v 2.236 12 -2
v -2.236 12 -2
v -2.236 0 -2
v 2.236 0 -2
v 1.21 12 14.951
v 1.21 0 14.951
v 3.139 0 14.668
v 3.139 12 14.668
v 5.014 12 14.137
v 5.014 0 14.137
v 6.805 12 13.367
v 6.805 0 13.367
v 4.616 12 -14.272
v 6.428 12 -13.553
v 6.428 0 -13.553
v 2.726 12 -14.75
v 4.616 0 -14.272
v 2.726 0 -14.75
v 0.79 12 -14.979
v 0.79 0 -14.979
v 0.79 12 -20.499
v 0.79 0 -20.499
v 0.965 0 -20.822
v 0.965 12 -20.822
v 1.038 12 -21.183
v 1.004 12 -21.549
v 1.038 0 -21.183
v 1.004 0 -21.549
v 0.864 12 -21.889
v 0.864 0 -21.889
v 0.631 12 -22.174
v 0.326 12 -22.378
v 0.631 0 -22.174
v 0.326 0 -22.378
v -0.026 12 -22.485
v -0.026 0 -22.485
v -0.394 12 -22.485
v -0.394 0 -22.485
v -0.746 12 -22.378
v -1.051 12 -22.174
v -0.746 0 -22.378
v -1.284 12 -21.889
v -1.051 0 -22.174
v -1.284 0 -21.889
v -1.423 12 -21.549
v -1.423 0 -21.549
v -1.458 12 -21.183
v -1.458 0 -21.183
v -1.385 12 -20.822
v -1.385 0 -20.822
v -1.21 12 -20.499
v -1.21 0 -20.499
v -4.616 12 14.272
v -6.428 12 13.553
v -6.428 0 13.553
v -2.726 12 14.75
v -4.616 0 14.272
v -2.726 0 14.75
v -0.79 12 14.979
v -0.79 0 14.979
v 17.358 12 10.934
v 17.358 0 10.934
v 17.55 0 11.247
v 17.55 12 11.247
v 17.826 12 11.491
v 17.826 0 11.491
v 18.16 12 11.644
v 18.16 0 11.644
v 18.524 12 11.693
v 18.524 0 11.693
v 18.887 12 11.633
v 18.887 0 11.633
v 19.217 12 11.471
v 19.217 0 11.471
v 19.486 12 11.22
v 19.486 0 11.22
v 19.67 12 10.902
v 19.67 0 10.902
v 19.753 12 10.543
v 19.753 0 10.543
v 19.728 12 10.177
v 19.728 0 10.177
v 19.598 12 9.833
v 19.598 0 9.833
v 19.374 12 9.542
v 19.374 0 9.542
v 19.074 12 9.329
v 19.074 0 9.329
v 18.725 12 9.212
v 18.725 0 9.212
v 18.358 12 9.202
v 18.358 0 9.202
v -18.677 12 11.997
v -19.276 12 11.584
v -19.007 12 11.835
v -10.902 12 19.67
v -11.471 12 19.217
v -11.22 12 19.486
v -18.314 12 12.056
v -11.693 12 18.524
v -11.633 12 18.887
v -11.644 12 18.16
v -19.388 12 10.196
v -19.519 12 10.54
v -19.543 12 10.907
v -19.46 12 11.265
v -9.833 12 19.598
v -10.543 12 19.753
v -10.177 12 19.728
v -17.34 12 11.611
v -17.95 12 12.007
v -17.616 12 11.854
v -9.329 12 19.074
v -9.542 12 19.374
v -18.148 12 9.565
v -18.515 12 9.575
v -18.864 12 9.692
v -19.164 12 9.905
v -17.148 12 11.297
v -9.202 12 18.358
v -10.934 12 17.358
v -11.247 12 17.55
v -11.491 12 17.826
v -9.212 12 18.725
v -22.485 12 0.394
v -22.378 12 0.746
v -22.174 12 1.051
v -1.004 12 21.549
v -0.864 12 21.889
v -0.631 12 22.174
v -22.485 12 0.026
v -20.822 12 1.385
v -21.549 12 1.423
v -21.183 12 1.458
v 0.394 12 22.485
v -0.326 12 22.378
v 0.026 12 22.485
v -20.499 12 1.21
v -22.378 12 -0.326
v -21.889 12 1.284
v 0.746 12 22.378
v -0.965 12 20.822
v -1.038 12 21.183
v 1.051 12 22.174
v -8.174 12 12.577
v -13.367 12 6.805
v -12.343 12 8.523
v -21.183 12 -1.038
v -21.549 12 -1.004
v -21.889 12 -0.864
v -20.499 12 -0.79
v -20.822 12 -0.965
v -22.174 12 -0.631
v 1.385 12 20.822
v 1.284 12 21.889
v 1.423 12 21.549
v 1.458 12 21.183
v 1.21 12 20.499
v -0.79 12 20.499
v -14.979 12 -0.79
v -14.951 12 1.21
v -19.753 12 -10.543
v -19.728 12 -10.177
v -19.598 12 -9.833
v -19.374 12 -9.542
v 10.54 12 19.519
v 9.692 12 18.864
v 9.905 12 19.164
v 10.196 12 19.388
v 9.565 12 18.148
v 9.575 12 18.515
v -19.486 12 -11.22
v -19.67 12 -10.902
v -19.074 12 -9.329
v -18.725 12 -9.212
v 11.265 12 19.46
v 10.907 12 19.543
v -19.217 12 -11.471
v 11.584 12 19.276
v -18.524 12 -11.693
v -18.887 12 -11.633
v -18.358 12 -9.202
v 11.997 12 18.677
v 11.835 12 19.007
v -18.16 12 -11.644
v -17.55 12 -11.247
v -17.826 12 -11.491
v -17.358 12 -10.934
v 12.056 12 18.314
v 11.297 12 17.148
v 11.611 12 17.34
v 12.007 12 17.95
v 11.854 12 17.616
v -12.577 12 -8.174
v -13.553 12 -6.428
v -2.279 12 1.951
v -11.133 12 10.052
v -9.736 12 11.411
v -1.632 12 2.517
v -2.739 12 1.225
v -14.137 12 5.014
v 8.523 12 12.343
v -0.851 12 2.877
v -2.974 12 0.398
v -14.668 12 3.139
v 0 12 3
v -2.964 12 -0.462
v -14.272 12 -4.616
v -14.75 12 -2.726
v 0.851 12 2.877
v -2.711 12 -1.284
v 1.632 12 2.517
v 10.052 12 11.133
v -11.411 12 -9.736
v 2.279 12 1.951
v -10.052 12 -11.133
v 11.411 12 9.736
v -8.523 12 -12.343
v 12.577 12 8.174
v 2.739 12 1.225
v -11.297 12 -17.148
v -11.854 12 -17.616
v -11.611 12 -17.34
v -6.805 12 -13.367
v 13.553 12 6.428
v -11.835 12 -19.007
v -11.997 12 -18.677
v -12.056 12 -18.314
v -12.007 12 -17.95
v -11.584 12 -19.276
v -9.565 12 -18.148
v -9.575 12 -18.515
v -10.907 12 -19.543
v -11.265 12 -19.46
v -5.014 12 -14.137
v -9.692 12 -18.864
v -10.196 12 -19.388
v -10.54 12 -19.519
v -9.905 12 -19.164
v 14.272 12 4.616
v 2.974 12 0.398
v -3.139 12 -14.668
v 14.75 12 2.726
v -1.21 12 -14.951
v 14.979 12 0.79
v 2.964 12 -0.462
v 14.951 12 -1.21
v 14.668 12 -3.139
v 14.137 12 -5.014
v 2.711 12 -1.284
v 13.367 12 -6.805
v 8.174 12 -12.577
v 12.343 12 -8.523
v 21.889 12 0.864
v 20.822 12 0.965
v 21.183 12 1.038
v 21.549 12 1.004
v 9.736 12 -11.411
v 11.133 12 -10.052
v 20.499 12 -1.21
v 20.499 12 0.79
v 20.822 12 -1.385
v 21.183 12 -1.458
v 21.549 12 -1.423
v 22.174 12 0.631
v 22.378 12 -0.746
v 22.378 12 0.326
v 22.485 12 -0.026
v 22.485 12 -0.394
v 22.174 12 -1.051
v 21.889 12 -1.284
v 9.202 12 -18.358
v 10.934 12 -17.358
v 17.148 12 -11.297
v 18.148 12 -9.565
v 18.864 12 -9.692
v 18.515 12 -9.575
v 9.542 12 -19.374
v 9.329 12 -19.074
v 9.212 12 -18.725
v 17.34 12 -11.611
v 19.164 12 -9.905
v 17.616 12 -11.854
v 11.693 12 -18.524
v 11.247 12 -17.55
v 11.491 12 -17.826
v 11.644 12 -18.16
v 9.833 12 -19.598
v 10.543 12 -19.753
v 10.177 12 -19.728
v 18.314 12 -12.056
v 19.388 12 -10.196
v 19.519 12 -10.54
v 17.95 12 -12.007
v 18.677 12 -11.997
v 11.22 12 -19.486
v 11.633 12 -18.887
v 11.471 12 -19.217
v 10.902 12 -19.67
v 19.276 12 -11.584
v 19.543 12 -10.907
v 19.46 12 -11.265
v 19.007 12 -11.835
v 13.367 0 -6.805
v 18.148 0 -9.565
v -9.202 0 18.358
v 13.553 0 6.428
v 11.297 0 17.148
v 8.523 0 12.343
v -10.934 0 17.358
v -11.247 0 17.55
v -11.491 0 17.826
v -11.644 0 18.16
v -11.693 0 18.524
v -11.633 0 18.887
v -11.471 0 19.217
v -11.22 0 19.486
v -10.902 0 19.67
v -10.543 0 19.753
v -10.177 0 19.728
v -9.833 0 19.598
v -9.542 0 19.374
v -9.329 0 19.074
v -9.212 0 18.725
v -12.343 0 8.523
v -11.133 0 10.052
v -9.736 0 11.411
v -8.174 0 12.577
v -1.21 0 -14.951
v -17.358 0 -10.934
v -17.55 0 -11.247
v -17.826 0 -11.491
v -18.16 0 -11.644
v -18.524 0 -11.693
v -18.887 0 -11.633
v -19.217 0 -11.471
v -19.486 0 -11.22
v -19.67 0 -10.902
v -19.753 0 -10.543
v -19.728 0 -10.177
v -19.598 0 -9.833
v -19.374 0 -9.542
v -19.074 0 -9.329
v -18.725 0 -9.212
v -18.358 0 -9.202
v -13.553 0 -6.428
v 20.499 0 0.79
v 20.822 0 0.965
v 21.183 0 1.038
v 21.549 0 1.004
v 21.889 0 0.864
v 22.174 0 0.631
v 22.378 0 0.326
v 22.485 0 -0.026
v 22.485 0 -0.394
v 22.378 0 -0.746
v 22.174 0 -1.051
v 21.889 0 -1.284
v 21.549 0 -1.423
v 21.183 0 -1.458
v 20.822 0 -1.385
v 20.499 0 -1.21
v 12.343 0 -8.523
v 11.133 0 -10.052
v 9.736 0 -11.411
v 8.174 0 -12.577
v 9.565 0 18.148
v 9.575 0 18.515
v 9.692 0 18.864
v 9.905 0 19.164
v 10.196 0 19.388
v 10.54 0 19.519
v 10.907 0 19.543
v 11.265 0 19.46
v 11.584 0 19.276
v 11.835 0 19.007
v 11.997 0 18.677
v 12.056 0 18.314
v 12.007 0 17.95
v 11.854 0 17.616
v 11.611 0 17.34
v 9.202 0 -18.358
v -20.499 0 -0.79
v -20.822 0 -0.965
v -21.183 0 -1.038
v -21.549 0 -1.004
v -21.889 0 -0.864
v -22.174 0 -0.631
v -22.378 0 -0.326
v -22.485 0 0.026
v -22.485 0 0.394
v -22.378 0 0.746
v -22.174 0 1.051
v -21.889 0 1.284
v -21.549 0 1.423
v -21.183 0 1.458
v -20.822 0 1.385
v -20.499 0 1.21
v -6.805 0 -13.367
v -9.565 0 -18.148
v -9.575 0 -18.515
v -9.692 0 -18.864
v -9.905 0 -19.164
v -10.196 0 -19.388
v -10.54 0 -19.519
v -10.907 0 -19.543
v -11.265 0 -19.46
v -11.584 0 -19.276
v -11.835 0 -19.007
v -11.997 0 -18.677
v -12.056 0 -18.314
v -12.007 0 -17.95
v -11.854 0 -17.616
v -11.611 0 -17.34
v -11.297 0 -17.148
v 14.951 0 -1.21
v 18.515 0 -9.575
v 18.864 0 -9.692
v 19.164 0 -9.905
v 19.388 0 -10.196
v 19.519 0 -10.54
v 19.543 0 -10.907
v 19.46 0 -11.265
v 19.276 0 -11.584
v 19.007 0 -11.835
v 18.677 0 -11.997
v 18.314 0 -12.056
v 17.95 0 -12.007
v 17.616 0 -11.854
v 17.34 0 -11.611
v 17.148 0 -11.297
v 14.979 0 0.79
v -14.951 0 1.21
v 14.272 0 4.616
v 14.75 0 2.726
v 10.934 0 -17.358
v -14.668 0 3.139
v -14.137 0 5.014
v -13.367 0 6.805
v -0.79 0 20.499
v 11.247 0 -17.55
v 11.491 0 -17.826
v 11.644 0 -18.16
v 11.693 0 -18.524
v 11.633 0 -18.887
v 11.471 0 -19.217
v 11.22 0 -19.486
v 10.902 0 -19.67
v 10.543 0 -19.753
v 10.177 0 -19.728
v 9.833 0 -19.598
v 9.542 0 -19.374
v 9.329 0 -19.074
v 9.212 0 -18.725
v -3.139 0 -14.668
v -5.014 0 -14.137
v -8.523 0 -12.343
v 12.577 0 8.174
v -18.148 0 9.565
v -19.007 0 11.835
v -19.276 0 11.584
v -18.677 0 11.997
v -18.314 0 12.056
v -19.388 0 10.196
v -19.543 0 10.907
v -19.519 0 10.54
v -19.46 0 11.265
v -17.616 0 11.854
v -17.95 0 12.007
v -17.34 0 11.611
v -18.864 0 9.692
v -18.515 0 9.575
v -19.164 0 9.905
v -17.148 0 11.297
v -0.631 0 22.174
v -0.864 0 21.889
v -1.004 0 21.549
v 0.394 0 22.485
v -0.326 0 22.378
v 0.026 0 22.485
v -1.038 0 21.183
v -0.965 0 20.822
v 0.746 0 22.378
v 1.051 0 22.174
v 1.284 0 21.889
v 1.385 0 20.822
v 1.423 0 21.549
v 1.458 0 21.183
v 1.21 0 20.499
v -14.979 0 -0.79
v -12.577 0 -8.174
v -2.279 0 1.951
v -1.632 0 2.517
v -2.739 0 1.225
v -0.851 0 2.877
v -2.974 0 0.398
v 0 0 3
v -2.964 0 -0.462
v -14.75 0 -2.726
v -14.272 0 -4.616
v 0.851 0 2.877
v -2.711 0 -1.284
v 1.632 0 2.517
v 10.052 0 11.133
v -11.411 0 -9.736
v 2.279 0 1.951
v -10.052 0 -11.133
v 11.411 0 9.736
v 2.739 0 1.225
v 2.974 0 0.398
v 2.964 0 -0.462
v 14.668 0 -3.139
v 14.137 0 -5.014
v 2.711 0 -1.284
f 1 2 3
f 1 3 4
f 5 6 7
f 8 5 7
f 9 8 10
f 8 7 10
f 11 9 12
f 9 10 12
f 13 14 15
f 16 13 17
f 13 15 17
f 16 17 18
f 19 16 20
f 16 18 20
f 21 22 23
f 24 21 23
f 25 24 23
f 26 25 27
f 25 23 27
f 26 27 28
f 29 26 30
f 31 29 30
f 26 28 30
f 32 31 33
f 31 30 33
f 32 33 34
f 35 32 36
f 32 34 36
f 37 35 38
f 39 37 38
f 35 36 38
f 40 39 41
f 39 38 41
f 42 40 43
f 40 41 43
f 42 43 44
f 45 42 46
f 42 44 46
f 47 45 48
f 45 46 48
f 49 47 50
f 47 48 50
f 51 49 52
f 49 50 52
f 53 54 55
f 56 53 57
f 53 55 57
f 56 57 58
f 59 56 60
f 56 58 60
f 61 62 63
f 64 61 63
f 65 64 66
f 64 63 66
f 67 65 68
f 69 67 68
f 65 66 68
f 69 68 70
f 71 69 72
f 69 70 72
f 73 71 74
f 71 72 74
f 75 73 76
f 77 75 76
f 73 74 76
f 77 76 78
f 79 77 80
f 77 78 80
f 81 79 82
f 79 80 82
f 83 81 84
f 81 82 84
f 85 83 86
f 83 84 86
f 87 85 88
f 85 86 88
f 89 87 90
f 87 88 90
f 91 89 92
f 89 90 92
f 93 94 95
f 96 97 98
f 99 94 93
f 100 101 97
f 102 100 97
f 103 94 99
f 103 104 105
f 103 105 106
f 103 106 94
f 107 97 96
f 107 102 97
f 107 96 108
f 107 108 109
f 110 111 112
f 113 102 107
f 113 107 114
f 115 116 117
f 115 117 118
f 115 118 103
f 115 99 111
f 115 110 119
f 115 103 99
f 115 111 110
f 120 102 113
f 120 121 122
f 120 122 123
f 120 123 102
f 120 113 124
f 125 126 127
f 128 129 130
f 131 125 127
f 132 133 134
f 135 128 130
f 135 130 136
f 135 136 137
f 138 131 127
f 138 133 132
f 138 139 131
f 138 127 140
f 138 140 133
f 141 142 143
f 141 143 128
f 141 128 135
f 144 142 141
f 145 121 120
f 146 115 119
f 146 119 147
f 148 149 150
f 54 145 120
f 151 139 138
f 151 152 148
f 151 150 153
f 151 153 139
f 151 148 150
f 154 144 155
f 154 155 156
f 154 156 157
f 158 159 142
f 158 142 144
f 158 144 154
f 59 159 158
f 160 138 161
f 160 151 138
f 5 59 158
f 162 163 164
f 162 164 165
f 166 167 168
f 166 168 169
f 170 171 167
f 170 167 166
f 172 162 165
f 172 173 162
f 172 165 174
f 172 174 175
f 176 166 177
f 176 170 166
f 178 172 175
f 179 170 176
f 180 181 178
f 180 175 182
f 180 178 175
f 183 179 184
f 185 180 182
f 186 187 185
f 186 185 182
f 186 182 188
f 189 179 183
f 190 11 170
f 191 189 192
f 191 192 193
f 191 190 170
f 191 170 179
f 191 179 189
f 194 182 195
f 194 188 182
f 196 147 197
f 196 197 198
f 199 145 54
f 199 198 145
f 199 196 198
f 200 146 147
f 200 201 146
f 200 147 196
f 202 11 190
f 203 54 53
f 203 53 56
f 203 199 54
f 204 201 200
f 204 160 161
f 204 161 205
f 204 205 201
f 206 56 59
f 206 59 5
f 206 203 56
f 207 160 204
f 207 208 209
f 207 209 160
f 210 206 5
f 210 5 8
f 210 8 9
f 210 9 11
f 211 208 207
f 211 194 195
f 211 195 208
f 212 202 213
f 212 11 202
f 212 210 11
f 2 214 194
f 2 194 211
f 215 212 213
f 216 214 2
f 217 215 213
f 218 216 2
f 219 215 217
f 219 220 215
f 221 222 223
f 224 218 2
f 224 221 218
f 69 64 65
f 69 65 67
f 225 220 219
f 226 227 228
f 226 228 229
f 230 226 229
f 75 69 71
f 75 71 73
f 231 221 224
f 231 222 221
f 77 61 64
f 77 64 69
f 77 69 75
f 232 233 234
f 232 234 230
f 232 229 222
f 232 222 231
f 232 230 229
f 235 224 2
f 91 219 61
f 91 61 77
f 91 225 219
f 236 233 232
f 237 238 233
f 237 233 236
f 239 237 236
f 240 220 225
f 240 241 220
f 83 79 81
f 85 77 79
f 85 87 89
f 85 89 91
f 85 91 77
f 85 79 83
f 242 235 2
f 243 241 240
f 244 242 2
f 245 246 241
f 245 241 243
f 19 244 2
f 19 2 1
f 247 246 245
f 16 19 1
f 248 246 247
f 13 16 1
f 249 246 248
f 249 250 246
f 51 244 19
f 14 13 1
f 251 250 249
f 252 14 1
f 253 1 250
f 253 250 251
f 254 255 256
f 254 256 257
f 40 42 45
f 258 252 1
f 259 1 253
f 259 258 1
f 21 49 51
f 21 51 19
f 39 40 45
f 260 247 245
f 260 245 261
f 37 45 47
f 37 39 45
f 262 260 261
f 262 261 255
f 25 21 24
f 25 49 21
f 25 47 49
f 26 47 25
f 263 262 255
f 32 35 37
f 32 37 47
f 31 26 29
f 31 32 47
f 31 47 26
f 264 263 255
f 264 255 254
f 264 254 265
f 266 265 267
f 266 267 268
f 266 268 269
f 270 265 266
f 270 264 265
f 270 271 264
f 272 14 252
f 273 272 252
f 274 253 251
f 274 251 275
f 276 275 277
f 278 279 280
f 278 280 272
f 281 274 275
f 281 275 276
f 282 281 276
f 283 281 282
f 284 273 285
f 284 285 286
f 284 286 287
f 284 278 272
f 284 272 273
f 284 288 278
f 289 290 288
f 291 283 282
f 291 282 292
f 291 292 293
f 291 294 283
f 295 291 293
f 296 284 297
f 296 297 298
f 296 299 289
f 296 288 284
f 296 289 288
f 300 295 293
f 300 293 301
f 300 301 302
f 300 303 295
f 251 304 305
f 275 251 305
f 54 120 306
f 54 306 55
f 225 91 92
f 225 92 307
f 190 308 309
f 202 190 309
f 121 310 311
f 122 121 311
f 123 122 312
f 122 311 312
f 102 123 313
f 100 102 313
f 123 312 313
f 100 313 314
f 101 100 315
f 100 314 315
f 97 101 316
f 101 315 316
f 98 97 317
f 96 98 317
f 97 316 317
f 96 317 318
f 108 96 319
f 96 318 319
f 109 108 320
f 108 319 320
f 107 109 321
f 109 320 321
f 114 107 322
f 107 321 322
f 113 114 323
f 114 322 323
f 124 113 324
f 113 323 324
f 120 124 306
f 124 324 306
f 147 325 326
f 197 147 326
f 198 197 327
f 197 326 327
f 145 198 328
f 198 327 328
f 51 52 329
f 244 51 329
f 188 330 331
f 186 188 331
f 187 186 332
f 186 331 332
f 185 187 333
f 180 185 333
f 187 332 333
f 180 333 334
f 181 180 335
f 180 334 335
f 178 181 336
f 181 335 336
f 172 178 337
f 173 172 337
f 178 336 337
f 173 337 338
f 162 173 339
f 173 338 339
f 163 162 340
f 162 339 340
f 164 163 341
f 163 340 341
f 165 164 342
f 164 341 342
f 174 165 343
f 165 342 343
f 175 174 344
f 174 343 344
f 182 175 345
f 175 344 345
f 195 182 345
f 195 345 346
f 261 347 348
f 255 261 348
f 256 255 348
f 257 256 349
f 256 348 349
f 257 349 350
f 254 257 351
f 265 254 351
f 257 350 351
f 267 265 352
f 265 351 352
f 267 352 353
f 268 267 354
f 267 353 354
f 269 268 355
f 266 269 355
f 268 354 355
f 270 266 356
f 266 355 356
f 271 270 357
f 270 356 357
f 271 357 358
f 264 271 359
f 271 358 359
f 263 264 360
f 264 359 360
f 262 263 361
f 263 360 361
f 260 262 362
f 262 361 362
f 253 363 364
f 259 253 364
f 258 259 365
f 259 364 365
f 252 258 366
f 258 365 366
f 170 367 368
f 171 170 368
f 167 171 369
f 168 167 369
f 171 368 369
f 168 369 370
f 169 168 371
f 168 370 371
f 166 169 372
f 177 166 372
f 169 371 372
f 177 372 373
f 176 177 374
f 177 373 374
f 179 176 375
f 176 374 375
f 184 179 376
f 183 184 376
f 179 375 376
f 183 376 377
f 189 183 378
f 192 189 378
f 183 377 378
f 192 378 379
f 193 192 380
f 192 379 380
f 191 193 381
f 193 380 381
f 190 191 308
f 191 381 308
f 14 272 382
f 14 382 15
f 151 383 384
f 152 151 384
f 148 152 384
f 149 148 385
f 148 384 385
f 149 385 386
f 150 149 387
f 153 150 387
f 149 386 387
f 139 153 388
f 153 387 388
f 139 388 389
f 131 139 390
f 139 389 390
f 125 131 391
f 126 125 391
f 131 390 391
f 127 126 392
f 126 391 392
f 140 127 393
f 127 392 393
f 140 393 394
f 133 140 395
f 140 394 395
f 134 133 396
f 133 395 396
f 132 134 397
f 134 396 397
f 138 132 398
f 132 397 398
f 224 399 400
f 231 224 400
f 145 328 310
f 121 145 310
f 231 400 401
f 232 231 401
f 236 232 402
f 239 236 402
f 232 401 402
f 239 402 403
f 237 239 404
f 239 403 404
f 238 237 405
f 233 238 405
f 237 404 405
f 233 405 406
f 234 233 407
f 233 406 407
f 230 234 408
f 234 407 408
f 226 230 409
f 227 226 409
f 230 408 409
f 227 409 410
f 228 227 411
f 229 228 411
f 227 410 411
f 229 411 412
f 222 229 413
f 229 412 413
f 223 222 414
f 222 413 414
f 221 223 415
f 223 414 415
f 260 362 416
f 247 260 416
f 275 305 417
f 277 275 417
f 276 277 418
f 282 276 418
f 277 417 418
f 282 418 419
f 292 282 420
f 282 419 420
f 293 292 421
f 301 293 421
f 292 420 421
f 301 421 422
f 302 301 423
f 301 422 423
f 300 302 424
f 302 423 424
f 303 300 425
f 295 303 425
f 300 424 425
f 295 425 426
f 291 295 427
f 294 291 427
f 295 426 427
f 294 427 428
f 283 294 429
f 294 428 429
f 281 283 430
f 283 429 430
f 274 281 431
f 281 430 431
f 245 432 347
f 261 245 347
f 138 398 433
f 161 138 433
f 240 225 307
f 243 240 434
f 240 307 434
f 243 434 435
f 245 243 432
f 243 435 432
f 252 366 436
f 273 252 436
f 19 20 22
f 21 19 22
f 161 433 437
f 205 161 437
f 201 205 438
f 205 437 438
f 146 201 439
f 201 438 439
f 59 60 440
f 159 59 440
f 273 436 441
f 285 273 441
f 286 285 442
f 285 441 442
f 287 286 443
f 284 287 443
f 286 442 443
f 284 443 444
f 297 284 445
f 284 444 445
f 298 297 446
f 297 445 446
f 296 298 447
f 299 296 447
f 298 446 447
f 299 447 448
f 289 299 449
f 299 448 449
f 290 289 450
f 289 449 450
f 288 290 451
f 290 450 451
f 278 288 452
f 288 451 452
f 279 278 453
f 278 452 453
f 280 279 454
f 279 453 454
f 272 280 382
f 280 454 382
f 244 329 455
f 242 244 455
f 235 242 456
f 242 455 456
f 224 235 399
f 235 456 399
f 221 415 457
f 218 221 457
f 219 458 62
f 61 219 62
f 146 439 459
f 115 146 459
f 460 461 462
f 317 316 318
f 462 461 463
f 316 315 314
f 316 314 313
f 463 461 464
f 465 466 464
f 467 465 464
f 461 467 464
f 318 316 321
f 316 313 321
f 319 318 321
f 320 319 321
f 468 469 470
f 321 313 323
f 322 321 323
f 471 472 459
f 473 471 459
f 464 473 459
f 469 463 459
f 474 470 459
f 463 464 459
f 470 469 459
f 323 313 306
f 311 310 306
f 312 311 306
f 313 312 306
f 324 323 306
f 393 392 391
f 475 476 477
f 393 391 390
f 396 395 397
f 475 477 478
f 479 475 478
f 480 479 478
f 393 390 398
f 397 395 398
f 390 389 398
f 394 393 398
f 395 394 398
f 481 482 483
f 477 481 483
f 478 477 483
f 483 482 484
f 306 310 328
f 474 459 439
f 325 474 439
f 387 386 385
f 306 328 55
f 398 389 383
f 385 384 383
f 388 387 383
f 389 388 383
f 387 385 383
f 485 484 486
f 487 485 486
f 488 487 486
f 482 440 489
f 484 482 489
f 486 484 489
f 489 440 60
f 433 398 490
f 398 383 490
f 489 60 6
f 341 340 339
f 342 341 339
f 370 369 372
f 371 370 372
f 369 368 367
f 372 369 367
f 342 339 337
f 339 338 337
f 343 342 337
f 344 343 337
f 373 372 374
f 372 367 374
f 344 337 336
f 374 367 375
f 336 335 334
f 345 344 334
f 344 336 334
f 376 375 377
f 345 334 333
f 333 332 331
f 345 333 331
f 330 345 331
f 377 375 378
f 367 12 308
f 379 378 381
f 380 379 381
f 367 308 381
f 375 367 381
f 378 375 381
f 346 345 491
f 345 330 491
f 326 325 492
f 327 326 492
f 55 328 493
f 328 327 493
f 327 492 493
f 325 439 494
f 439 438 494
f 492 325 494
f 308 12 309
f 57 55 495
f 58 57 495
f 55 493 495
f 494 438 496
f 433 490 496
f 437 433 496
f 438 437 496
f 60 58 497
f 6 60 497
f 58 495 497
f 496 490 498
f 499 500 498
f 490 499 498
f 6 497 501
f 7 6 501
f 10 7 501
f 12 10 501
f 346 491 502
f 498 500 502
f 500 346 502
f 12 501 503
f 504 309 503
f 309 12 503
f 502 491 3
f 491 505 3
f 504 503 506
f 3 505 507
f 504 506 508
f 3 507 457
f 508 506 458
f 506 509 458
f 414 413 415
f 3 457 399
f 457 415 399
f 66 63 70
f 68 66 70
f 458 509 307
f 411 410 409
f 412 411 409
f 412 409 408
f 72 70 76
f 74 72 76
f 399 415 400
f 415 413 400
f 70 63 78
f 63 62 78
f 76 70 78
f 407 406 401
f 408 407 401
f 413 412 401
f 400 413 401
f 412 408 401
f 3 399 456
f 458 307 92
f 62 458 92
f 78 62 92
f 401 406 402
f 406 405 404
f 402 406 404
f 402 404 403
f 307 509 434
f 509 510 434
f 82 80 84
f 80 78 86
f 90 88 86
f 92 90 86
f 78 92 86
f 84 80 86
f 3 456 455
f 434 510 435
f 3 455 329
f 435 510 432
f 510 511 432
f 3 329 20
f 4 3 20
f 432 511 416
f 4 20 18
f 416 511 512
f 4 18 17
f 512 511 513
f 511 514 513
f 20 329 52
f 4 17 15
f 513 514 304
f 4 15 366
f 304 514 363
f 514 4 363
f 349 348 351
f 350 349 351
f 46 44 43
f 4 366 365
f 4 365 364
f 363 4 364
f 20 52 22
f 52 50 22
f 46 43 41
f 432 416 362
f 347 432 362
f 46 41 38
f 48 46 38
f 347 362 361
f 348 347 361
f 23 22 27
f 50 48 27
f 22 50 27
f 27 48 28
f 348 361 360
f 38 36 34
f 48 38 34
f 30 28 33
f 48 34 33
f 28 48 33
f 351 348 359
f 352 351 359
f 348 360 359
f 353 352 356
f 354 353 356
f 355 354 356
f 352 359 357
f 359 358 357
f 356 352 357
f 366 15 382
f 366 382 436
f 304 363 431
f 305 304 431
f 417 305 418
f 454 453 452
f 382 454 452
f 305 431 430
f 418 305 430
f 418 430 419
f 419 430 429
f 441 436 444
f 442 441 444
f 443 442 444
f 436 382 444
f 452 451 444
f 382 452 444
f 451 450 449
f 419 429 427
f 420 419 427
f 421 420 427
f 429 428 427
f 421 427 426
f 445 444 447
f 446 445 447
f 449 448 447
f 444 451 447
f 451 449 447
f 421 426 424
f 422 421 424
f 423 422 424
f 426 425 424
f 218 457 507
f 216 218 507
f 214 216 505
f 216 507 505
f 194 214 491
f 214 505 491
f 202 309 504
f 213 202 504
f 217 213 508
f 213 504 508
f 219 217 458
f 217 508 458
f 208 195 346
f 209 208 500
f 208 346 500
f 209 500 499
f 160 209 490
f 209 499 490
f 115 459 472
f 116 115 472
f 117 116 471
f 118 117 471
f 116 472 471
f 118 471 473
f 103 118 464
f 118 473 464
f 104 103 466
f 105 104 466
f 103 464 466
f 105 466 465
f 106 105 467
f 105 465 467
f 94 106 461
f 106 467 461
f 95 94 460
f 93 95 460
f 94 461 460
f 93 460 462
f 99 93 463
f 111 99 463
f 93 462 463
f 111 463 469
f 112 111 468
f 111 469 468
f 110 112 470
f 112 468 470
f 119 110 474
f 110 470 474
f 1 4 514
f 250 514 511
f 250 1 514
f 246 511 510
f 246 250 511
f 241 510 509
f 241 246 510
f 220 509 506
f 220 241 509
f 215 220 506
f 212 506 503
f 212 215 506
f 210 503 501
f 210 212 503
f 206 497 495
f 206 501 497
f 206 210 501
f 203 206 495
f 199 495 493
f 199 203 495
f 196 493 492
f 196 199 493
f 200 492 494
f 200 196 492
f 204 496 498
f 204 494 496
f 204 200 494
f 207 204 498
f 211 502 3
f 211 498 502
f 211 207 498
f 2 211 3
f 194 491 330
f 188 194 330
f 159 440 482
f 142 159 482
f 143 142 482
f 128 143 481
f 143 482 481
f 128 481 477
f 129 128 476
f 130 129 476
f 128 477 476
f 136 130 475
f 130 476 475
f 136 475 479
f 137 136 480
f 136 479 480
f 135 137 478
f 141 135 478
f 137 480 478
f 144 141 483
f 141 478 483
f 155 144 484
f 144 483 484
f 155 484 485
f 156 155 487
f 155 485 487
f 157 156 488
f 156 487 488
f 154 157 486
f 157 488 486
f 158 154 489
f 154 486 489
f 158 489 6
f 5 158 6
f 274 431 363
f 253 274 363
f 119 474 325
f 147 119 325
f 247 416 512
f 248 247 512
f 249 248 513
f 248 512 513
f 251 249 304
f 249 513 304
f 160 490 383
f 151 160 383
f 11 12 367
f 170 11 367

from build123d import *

# Parameters (mm, degrees)
BOSS_EXTRUDE1_DEPTH = 12
CUT_EXTRUDE1_DEPTH  = 13


with BuildPart() as part:
    # Sketch1 → Boss-Extrude1 (new body)
    with BuildSketch(Plane(origin=(0, 0, 0), x_dir=(1, 0, 0), z_dir=(0, 1, 0))):
        with BuildLine():
            Line((-1.209935044, 20.498962969), (-1.209935044, 14.951122272))
            ThreePointArc((-1.209935044, 14.951122272), (-4.085137635, 14.433005595), (-6.805373075, 13.367381842))
            Line((-6.805373075, 13.367381842), (-9.565265163, 18.147655161))
            ThreePointArc((-9.565265163, 18.147655161), (-11.431290566, 19.379705968), (-11.29731597, 17.147655161))
            Line((-11.29731597, 17.147655161), (-8.523395621, 12.34308418))
            ThreePointArc((-8.523395621, 12.34308418), (-10.754335768, 10.45678068), (-12.577316886, 8.17380572))
            Line((-12.577316886, 8.17380572), (-17.357590205, 10.933697807))
            ThreePointArc((-17.357590205, 10.933697807), (-19.589641013, 11.067672403), (-18.357590205, 9.201646999))
            Line((-18.357590205, 9.201646999), (-13.553019225, 6.427726651))
            ThreePointArc((-13.553019225, 6.427726651), (-14.541918316, 3.678669827), (-14.979178795, 0.790064956))
            Line((-14.979178795, 0.790064956), (-20.498962969, 0.790064956))
            ThreePointArc((-20.498962969, 0.790064956), (-22.498962969, -0.209935044), (-20.498962969, -1.209935044))
            Line((-20.498962969, -1.209935044), (-14.951122272, -1.209935044))
            ThreePointArc((-14.951122272, -1.209935044), (-14.433005595, -4.085137635), (-13.367381842, -6.805373075))
            Line((-13.367381842, -6.805373075), (-18.147655161, -9.565265163))
            ThreePointArc((-18.147655161, -9.565265163), (-19.379705968, -11.431290566), (-17.147655161, -11.29731597))
            Line((-17.147655161, -11.29731597), (-12.34308418, -8.523395621))
            ThreePointArc((-12.34308418, -8.523395621), (-10.45678068, -10.754335768), (-8.17380572, -12.577316886))
            Line((-8.17380572, -12.577316886), (-10.933697807, -17.357590205))
            ThreePointArc((-10.933697807, -17.357590205), (-11.067672403, -19.589641013), (-9.201646999, -18.357590205))
            Line((-9.201646999, -18.357590205), (-6.427726651, -13.553019225))
            ThreePointArc((-6.427726651, -13.553019225), (-3.678669827, -14.541918316), (-0.790064956, -14.979178795))
            Line((-0.790064956, -14.979178795), (-0.790064956, -20.498962969))
            ThreePointArc((-0.790064956, -20.498962969), (0.209935044, -22.498962969), (1.209935044, -20.498962969))
            Line((1.209935044, -20.498962969), (1.209935044, -14.951122272))
            ThreePointArc((1.209935044, -14.951122272), (4.085137635, -14.433005595), (6.805373075, -13.367381842))
            Line((6.805373075, -13.367381842), (9.565265163, -18.147655161))
            ThreePointArc((9.565265163, -18.147655161), (11.431290566, -19.379705968), (11.29731597, -17.147655161))
            Line((11.29731597, -17.147655161), (8.523395621, -12.34308418))
            ThreePointArc((8.523395621, -12.34308418), (10.754335768, -10.45678068), (12.577316886, -8.17380572))
            Line((12.577316886, -8.17380572), (17.357590205, -10.933697807))
            ThreePointArc((17.357590205, -10.933697807), (19.589641013, -11.067672403), (18.357590205, -9.201646999))
            Line((18.357590205, -9.201646999), (13.553019225, -6.427726651))
            ThreePointArc((13.553019225, -6.427726651), (14.541918316, -3.678669827), (14.979178795, -0.790064956))
            Line((14.979178795, -0.790064956), (20.498962969, -0.790064956))
            ThreePointArc((20.498962969, -0.790064956), (22.498962969, 0.209935044), (20.498962969, 1.209935044))
            Line((20.498962969, 1.209935044), (14.951122272, 1.209935044))
            ThreePointArc((14.951122272, 1.209935044), (14.433005595, 4.085137635), (13.367381842, 6.805373075))
            Line((13.367381842, 6.805373075), (18.147655161, 9.565265163))
            ThreePointArc((18.147655161, 9.565265163), (19.379705968, 11.431290566), (17.147655161, 11.29731597))
            Line((17.147655161, 11.29731597), (12.34308418, 8.523395621))
            ThreePointArc((12.34308418, 8.523395621), (10.45678068, 10.754335768), (8.17380572, 12.577316886))
            Line((8.17380572, 12.577316886), (10.933697807, 17.357590205))
            ThreePointArc((10.933697807, 17.357590205), (11.067672403, 19.589641013), (9.201646999, 18.357590205))
            Line((9.201646999, 18.357590205), (6.427726651, 13.553019225))
            ThreePointArc((6.427726651, 13.553019225), (3.678669827, 14.541918316), (0.790064956, 14.979178795))
            Line((0.790064956, 14.979178795), (0.790064956, 20.498962969))
            ThreePointArc((0.790064956, 20.498962969), (-0.209935044, 22.498962969), (-1.209935044, 20.498962969))
        make_face()
    extrude(amount=BOSS_EXTRUDE1_DEPTH)

    # Sketch2 → Cut-Extrude1 (cut, through all)
    with BuildSketch(Plane(origin=(0, 12, 0), x_dir=(1, 0, 0), z_dir=(0, 1, 0))):
        with BuildLine():
            Line((-2.236067977, 2), (2.236067977, 2))
            ThreePointArc((2.236067977, 2), (0, -3), (-2.236067977, 2))
        make_face()
    extrude(amount=-CUT_EXTRUDE1_DEPTH, mode=Mode.SUBTRACT)


solid = part.part
